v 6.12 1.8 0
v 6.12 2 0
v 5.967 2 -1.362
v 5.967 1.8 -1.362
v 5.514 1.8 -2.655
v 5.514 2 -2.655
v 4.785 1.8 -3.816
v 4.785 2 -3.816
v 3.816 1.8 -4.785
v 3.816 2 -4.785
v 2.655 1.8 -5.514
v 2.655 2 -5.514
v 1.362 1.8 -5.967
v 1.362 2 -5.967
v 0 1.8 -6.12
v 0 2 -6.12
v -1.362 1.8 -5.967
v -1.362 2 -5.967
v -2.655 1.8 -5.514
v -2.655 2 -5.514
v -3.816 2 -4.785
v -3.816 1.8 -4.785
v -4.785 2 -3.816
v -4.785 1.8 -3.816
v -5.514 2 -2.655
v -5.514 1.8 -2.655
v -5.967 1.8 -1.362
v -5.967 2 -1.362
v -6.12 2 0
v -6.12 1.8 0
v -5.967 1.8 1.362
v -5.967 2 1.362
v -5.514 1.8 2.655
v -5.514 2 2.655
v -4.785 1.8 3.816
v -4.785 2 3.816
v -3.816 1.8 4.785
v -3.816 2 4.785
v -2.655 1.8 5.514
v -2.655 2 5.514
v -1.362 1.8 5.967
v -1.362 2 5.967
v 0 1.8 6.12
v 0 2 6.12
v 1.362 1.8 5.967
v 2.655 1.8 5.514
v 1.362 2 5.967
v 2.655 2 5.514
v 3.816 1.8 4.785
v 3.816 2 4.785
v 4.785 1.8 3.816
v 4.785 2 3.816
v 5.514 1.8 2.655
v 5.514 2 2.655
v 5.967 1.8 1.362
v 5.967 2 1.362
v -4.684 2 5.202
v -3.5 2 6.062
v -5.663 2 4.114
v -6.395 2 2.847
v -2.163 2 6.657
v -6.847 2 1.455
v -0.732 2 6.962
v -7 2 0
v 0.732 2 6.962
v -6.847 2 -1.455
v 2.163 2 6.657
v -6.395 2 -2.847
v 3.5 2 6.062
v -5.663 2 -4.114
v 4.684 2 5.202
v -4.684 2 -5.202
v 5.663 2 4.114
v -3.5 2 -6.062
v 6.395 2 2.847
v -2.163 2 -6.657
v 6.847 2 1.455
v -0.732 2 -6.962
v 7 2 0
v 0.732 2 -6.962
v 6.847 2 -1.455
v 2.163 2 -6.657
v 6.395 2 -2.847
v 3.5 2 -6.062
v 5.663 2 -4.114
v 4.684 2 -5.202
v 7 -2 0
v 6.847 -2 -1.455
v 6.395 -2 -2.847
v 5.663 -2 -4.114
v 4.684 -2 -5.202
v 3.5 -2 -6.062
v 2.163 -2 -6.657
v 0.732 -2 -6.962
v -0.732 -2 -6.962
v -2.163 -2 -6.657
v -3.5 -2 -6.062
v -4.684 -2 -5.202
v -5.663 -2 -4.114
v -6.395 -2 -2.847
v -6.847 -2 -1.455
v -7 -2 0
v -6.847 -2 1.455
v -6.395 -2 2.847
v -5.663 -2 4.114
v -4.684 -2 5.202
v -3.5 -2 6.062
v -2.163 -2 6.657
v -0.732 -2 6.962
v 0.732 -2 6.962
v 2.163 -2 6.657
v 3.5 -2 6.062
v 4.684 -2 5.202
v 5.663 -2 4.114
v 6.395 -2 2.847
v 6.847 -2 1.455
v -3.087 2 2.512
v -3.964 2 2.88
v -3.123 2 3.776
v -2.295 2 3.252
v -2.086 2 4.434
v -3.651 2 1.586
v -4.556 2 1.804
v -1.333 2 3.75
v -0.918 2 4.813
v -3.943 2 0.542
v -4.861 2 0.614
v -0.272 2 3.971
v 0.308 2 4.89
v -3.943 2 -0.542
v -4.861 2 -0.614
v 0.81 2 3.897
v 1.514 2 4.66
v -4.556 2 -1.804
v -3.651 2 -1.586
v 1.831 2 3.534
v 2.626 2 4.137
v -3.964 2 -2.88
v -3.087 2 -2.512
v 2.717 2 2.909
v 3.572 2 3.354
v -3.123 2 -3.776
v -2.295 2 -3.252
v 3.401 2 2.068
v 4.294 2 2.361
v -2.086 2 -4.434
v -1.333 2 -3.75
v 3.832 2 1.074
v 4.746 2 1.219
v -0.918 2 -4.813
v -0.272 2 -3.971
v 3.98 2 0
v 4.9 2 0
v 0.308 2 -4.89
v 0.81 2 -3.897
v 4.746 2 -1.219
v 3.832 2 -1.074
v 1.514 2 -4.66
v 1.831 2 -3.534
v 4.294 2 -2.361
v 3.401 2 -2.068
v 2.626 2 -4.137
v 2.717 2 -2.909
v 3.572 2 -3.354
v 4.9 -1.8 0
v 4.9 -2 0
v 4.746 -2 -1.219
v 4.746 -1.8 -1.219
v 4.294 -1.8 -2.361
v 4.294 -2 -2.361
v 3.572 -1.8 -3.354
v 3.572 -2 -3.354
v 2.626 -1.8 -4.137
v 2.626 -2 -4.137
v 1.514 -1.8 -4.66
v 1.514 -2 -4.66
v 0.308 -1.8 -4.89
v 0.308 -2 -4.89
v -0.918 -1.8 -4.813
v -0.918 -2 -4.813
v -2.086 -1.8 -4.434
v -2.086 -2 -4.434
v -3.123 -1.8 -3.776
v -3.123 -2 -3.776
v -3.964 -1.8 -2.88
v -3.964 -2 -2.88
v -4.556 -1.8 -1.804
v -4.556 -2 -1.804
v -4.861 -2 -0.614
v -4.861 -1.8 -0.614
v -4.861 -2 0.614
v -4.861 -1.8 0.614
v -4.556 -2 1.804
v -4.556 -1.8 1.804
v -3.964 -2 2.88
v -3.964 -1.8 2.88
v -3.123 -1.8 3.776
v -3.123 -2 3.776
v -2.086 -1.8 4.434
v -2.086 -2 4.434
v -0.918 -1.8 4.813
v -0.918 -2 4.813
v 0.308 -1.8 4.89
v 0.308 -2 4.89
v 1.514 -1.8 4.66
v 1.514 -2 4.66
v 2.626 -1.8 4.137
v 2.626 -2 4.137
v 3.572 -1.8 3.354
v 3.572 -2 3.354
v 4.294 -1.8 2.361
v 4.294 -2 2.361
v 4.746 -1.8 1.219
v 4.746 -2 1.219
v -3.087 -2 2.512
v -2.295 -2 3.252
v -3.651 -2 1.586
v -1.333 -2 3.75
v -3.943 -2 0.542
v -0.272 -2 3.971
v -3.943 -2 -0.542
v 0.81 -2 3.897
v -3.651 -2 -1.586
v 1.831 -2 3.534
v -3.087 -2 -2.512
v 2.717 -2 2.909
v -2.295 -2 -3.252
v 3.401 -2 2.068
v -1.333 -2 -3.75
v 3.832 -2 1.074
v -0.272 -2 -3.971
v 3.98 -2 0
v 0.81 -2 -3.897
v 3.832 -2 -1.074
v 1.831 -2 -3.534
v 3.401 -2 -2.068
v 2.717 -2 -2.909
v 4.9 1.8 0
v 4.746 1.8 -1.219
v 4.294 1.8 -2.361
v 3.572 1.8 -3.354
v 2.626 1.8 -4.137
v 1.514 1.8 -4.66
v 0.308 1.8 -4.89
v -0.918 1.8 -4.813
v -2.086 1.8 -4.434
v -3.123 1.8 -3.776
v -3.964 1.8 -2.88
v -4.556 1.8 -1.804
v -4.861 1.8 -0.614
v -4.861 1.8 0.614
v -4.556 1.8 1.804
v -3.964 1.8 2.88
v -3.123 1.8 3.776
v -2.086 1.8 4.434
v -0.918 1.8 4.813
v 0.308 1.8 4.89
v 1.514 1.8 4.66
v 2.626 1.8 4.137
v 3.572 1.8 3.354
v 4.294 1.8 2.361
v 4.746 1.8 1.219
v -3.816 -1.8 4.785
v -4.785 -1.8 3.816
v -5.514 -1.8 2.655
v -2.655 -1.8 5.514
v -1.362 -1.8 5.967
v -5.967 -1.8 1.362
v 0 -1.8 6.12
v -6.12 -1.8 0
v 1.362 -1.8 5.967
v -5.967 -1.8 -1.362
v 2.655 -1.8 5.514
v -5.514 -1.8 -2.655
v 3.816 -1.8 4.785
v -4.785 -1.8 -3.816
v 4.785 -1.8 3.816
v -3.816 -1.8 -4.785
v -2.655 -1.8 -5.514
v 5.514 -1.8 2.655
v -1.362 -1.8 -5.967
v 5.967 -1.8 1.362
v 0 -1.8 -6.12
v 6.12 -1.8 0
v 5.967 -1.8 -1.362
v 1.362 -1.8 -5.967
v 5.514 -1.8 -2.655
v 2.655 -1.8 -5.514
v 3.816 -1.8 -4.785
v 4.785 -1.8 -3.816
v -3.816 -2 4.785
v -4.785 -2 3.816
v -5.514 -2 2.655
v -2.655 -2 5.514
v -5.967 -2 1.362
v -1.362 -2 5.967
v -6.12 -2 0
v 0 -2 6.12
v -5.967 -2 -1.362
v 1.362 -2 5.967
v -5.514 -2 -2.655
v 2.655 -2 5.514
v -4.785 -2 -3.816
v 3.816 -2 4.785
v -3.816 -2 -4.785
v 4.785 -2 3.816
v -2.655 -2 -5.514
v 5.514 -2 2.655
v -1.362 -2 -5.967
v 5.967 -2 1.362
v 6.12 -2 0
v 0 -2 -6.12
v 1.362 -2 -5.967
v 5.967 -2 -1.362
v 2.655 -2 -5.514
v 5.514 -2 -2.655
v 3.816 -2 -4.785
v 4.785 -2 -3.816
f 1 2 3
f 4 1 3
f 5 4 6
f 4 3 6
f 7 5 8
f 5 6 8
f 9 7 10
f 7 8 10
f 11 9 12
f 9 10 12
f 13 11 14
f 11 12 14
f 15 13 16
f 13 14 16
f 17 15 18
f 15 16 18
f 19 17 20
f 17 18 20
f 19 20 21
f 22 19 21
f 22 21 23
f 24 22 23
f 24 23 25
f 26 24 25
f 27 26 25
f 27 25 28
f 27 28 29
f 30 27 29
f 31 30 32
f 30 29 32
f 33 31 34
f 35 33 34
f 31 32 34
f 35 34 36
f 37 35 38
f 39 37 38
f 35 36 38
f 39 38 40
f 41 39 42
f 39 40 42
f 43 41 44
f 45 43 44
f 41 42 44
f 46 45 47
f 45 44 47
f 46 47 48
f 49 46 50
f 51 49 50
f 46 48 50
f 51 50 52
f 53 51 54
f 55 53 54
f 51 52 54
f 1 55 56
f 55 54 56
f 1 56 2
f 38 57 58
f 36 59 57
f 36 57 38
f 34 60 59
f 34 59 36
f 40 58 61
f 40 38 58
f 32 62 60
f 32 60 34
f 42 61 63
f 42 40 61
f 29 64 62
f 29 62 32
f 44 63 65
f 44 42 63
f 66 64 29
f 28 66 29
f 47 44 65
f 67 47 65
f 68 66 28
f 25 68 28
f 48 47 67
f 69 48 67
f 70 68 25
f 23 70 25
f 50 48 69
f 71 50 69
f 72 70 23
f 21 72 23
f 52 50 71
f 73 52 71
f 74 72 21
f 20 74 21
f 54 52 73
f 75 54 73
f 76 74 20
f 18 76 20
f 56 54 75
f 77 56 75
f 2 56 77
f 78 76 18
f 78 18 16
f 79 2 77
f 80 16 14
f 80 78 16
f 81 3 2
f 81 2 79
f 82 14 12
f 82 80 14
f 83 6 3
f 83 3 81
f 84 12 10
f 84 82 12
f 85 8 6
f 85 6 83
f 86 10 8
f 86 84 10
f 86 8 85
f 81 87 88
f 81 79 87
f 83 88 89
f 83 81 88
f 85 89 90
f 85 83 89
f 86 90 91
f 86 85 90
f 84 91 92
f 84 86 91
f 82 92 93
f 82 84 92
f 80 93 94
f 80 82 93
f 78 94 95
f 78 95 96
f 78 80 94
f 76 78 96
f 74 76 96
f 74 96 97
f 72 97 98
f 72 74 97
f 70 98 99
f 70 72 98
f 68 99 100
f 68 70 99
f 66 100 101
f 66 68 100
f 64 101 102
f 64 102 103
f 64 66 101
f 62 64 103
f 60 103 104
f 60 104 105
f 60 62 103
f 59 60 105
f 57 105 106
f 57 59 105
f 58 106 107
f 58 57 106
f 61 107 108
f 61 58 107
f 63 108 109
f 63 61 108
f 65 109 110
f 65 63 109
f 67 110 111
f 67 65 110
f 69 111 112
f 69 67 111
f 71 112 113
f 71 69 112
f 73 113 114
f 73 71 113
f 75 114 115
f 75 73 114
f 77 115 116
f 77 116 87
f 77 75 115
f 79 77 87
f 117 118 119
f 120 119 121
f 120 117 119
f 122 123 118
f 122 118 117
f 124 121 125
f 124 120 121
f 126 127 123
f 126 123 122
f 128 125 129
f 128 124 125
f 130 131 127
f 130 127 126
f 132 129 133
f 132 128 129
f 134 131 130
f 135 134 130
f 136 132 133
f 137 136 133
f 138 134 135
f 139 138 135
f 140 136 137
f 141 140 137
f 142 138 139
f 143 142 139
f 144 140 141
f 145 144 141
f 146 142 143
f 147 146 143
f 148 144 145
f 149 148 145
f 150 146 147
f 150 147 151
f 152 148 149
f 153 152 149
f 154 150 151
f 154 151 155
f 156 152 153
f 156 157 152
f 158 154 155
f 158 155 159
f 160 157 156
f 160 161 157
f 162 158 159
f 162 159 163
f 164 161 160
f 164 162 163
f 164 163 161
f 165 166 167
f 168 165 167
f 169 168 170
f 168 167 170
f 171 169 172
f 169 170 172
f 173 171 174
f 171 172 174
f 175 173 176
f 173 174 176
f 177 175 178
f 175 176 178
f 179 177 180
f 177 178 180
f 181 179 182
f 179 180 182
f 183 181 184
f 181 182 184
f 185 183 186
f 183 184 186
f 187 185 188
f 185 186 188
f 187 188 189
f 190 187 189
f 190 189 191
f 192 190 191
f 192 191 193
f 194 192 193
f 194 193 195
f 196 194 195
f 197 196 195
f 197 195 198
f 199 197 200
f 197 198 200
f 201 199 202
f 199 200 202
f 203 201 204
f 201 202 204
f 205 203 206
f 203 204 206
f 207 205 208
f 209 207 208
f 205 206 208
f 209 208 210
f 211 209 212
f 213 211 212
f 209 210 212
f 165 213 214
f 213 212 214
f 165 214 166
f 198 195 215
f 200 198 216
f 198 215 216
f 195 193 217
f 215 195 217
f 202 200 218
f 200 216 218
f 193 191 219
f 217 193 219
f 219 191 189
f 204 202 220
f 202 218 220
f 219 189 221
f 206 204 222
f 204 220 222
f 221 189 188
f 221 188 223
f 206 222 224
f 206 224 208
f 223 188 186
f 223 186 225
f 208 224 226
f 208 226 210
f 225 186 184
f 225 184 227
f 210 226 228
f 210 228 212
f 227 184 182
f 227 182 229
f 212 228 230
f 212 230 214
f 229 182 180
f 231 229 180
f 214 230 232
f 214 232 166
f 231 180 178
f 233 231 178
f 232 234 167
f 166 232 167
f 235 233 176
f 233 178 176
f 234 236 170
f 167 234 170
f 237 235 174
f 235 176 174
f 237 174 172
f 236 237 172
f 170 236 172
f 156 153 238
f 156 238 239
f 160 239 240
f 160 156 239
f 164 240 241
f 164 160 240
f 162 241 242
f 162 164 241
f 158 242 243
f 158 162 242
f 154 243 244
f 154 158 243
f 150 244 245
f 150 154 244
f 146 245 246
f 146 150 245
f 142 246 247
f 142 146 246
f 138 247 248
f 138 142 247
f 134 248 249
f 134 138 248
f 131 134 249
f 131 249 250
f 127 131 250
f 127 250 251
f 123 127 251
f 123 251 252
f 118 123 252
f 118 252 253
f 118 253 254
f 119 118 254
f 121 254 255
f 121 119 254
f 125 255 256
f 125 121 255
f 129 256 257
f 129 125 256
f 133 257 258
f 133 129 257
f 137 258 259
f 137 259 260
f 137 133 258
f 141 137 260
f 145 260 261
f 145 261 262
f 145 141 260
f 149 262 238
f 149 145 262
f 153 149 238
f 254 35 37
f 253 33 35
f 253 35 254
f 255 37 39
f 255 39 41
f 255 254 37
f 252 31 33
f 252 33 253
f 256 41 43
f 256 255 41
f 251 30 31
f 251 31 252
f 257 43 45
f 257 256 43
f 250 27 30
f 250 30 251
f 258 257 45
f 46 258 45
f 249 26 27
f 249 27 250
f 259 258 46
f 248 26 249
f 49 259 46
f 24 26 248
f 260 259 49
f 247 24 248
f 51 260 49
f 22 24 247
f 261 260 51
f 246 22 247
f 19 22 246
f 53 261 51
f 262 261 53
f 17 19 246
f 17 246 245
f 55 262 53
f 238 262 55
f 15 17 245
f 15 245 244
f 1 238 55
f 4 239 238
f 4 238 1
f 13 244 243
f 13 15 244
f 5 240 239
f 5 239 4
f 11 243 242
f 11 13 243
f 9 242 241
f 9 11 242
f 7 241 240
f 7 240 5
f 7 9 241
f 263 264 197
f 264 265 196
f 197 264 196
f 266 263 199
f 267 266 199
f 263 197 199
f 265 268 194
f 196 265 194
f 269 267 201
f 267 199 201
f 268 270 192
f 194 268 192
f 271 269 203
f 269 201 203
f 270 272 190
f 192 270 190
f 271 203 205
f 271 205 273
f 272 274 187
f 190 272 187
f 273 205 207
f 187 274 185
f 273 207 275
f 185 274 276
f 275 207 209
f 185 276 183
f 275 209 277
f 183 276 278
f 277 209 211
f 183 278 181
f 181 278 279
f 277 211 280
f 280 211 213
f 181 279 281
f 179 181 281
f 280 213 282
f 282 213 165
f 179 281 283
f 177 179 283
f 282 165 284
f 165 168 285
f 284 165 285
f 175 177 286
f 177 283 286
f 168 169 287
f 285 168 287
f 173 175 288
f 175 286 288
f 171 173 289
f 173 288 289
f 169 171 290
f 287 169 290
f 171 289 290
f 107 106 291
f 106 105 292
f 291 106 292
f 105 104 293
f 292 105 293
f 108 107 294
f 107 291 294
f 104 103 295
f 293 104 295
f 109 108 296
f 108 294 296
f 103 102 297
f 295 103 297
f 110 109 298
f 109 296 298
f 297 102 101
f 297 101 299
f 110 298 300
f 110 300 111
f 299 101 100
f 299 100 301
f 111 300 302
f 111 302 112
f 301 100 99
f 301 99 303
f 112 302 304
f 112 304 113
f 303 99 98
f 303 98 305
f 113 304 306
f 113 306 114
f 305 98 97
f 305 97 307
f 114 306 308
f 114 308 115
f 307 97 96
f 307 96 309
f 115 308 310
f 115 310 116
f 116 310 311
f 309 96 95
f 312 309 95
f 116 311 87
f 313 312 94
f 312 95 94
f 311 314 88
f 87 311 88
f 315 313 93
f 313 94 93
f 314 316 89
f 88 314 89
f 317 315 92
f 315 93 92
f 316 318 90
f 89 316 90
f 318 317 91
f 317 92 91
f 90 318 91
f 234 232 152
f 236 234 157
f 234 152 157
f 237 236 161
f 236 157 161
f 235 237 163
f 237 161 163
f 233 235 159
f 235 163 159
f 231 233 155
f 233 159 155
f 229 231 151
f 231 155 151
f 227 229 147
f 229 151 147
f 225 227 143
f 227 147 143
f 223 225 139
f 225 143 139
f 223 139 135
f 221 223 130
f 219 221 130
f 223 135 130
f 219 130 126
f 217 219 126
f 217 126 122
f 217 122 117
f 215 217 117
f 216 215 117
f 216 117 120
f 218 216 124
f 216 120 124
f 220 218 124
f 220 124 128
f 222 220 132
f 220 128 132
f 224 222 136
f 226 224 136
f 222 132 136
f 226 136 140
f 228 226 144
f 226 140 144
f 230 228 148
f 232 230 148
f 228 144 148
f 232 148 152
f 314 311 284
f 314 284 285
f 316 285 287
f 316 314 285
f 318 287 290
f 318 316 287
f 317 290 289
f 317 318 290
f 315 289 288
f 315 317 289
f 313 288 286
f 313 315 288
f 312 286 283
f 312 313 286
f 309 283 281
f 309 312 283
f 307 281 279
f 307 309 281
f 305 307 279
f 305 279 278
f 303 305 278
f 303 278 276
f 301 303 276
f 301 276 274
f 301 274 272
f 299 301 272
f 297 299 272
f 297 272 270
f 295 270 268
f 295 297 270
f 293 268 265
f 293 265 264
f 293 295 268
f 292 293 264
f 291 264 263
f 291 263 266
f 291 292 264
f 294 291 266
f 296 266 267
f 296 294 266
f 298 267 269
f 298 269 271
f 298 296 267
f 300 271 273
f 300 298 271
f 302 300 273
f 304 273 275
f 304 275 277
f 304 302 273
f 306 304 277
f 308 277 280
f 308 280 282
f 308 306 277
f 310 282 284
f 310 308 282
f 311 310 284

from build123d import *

# Parameters (mm, degrees)
SKETCH1_R               = 7
BOSS_EXTRUDE1_DEPTH     = 2
SKETCH2_R               = 3.98
CUT_EXTRUDE1_DEPTH      = 3
CUT_EXTRUDE1_DEPTH_BACK = 3
CUT_EXTRUDE2_START      = 2
SKETCH3_R               = 6.12
SKETCH3_R_2             = 4.9
CUT_EXTRUDE2_DEPTH      = 0.2


with BuildPart() as part:
    # Sketch1 → Boss-Extrude1 (new body, symmetric)
    with BuildSketch(Plane(origin=(0, 0, 0), x_dir=(1, 0, 0), z_dir=(0, 1, 0))):
        Circle(SKETCH1_R)
    extrude(amount=BOSS_EXTRUDE1_DEPTH, both=True)

    # Sketch2 → Cut-Extrude1 (cut, two sides)
    with BuildSketch(Plane(origin=(0, 0, 0), x_dir=(1, 0, 0), z_dir=(0, 1, 0))) as cut_extrude1_sk:
        Circle(SKETCH2_R)
    extrude(amount=CUT_EXTRUDE1_DEPTH, mode=Mode.SUBTRACT)
    extrude(cut_extrude1_sk.sketch, amount=-CUT_EXTRUDE1_DEPTH_BACK, mode=Mode.SUBTRACT)

    # Sketch3 → Cut-Extrude2 (cut)
    with BuildSketch(Plane(origin=(0, 0, 0), x_dir=(1, 0, 0), z_dir=(0, 1, 0)).offset(CUT_EXTRUDE2_START)):
        Circle(SKETCH3_R)
        Circle(SKETCH3_R_2, mode=Mode.SUBTRACT)
    cut_extrude2 = extrude(amount=-CUT_EXTRUDE2_DEPTH, mode=Mode.SUBTRACT)

    # Mirror1: Cut-Extrude2 across plane
    add(cut_extrude2.mirror(Plane.ZX), mode=Mode.SUBTRACT)


solid = part.part
